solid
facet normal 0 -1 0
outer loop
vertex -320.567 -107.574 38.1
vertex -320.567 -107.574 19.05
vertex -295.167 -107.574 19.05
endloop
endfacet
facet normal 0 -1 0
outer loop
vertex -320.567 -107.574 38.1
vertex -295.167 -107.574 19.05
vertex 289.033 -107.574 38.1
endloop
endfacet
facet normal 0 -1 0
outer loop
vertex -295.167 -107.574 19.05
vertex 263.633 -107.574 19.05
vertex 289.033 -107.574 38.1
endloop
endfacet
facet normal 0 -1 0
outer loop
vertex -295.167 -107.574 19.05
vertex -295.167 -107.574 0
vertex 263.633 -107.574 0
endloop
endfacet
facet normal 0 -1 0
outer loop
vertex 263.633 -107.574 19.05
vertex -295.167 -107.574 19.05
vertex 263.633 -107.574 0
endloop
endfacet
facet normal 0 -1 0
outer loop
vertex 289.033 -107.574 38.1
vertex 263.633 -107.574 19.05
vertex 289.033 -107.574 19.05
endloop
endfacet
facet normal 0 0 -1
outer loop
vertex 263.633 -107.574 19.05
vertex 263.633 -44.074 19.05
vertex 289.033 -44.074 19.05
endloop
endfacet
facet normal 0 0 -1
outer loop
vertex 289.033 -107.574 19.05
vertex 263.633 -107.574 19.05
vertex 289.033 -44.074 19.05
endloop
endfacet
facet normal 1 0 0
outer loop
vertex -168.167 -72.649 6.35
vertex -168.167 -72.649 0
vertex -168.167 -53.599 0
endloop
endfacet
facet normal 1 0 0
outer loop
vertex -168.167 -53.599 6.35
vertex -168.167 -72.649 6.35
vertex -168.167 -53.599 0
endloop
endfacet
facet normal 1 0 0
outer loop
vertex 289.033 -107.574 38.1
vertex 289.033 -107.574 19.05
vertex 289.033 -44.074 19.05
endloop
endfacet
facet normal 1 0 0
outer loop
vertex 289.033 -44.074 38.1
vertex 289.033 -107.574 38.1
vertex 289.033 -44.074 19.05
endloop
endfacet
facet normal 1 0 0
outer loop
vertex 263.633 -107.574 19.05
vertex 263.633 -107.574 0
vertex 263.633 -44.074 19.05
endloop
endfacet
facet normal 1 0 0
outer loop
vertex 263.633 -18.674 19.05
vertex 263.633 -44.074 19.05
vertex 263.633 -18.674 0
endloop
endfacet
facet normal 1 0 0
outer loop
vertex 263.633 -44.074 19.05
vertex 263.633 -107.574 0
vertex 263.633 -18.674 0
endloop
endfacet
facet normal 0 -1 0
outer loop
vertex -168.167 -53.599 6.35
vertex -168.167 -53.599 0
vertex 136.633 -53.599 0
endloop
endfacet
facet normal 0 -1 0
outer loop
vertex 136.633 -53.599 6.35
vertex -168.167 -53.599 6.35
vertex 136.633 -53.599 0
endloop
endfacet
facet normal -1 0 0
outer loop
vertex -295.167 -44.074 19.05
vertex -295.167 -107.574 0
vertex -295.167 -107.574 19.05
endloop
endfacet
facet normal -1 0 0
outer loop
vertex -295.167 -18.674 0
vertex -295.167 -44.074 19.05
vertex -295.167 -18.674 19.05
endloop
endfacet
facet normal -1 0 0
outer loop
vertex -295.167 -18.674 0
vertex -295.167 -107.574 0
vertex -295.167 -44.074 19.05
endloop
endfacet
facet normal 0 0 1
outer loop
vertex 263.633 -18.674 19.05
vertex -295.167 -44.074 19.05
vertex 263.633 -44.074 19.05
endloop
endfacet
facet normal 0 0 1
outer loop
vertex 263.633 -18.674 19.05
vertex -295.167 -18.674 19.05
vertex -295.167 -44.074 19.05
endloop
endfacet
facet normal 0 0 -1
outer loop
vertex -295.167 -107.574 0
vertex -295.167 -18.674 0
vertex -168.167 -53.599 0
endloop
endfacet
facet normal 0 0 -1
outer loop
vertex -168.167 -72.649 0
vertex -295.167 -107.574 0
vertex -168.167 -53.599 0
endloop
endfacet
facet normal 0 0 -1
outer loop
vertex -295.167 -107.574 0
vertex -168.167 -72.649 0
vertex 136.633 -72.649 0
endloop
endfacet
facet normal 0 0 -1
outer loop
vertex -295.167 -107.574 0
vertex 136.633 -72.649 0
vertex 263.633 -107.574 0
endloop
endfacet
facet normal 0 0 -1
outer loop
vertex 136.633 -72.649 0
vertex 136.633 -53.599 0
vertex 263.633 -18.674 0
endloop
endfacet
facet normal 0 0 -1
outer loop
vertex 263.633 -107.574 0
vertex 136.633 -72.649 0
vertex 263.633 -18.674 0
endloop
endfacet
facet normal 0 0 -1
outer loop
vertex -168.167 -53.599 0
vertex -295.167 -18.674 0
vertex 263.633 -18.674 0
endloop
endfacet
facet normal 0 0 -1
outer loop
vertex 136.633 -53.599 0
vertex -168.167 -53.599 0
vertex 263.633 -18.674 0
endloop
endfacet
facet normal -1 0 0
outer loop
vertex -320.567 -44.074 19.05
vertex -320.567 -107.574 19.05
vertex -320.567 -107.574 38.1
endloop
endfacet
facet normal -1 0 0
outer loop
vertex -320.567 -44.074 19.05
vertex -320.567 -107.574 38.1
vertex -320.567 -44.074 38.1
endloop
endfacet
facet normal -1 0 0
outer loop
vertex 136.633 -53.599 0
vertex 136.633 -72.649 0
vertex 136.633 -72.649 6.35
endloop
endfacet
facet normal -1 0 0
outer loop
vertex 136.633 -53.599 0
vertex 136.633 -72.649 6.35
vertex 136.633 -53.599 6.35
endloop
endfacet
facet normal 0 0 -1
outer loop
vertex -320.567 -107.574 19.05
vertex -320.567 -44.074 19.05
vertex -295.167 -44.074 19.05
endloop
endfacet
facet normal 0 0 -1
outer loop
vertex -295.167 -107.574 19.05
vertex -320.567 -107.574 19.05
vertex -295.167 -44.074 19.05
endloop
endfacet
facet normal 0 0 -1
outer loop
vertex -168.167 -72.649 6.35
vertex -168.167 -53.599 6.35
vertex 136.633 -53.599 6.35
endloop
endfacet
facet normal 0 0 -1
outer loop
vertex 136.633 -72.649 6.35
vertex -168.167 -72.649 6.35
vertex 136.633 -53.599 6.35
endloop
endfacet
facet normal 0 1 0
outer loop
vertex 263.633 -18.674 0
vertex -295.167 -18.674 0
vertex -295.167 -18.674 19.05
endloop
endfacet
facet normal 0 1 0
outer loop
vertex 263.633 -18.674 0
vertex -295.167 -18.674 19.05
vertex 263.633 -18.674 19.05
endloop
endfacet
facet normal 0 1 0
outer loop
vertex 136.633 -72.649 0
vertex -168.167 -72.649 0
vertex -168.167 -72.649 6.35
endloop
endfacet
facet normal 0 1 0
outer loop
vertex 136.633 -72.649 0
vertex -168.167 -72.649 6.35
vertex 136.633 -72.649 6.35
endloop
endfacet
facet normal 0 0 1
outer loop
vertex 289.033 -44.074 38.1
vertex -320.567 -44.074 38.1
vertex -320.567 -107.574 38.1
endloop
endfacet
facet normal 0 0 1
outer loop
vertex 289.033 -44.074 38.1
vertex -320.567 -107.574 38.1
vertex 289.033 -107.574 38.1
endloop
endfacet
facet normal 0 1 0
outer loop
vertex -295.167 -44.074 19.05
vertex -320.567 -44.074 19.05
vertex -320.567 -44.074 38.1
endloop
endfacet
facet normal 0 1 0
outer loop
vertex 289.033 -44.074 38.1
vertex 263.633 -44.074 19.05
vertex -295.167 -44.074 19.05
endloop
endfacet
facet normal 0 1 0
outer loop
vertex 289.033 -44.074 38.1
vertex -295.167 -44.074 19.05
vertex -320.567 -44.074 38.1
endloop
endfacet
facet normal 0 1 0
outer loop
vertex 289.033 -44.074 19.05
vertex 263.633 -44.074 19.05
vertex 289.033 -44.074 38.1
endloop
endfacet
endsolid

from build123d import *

# Parameters (mm, degrees)
F0_W     = 558.8
F0_H     = 63.5
F0_W_2   = 304.8
F0_H_2   = 19.05
F0_W_3   = 25.4
F0_H_3   = 25.4
F1_DEPTH = 19.05
F2_DEPTH = 38.1
F3_DEPTH = 19.05
F4_DEPTH = 38.1
F5_DEPTH = 6.35


with BuildPart() as f1:
    # F0 (on Top) → F1 (new body)
    with BuildSketch(Plane.XY):
        with Locations((-15.767200847, -75.8242455751)):
            Rectangle(F0_W, F0_H)
        with Locations((-15.767200847, -63.1242455751)):
            Rectangle(F0_W_2, F0_H_2, mode=Mode.SUBTRACT)
        with Locations((-307.867200847, -75.8242455751)):
            Rectangle(F0_W_3, F0_H)
        with Locations((-15.767200847, -31.3742455751)):
            Rectangle(F0_W, F0_H_3)
        with Locations((276.332799153, -75.8242455751)):
            Rectangle(F0_W_3, F0_H)
    extrude(amount=F1_DEPTH)

    # F0 (on Top) → F2 (join)
    with BuildSketch(Plane.XY):
        with Locations((-15.767200847, -75.8242455751)):
            Rectangle(F0_W, F0_H)
        with Locations((-15.767200847, -63.1242455751)):
            Rectangle(F0_W_2, F0_H_2, mode=Mode.SUBTRACT)
        with Locations((-307.867200847, -75.8242455751)):
            Rectangle(F0_W_3, F0_H)
        with Locations((276.332799153, -75.8242455751)):
            Rectangle(F0_W_3, F0_H)
    extrude(amount=F2_DEPTH)

    # F0 (on Top) → F3 (cut)
    with BuildSketch(Plane.XY):
        with Locations((-307.867200847, -75.8242455751)):
            Rectangle(F0_W_3, F0_H)
        with Locations((276.332799153, -75.8242455751)):
            Rectangle(F0_W_3, F0_H)
    extrude(amount=F3_DEPTH, mode=Mode.SUBTRACT)

    # F0 (on Top) → F4 (join)
    with BuildSketch(Plane.XY):
        with Locations((-15.767200847, -63.1242455751)):
            Rectangle(F0_W_2, F0_H_2)
    extrude(amount=F4_DEPTH)

    # F0 (on Top) → F5 (cut)
    with BuildSketch(Plane.XY):
        with Locations((-15.767200847, -63.1242455751)):
            Rectangle(F0_W_2, F0_H_2)
    extrude(amount=F5_DEPTH, mode=Mode.SUBTRACT)


solid = f1.part
